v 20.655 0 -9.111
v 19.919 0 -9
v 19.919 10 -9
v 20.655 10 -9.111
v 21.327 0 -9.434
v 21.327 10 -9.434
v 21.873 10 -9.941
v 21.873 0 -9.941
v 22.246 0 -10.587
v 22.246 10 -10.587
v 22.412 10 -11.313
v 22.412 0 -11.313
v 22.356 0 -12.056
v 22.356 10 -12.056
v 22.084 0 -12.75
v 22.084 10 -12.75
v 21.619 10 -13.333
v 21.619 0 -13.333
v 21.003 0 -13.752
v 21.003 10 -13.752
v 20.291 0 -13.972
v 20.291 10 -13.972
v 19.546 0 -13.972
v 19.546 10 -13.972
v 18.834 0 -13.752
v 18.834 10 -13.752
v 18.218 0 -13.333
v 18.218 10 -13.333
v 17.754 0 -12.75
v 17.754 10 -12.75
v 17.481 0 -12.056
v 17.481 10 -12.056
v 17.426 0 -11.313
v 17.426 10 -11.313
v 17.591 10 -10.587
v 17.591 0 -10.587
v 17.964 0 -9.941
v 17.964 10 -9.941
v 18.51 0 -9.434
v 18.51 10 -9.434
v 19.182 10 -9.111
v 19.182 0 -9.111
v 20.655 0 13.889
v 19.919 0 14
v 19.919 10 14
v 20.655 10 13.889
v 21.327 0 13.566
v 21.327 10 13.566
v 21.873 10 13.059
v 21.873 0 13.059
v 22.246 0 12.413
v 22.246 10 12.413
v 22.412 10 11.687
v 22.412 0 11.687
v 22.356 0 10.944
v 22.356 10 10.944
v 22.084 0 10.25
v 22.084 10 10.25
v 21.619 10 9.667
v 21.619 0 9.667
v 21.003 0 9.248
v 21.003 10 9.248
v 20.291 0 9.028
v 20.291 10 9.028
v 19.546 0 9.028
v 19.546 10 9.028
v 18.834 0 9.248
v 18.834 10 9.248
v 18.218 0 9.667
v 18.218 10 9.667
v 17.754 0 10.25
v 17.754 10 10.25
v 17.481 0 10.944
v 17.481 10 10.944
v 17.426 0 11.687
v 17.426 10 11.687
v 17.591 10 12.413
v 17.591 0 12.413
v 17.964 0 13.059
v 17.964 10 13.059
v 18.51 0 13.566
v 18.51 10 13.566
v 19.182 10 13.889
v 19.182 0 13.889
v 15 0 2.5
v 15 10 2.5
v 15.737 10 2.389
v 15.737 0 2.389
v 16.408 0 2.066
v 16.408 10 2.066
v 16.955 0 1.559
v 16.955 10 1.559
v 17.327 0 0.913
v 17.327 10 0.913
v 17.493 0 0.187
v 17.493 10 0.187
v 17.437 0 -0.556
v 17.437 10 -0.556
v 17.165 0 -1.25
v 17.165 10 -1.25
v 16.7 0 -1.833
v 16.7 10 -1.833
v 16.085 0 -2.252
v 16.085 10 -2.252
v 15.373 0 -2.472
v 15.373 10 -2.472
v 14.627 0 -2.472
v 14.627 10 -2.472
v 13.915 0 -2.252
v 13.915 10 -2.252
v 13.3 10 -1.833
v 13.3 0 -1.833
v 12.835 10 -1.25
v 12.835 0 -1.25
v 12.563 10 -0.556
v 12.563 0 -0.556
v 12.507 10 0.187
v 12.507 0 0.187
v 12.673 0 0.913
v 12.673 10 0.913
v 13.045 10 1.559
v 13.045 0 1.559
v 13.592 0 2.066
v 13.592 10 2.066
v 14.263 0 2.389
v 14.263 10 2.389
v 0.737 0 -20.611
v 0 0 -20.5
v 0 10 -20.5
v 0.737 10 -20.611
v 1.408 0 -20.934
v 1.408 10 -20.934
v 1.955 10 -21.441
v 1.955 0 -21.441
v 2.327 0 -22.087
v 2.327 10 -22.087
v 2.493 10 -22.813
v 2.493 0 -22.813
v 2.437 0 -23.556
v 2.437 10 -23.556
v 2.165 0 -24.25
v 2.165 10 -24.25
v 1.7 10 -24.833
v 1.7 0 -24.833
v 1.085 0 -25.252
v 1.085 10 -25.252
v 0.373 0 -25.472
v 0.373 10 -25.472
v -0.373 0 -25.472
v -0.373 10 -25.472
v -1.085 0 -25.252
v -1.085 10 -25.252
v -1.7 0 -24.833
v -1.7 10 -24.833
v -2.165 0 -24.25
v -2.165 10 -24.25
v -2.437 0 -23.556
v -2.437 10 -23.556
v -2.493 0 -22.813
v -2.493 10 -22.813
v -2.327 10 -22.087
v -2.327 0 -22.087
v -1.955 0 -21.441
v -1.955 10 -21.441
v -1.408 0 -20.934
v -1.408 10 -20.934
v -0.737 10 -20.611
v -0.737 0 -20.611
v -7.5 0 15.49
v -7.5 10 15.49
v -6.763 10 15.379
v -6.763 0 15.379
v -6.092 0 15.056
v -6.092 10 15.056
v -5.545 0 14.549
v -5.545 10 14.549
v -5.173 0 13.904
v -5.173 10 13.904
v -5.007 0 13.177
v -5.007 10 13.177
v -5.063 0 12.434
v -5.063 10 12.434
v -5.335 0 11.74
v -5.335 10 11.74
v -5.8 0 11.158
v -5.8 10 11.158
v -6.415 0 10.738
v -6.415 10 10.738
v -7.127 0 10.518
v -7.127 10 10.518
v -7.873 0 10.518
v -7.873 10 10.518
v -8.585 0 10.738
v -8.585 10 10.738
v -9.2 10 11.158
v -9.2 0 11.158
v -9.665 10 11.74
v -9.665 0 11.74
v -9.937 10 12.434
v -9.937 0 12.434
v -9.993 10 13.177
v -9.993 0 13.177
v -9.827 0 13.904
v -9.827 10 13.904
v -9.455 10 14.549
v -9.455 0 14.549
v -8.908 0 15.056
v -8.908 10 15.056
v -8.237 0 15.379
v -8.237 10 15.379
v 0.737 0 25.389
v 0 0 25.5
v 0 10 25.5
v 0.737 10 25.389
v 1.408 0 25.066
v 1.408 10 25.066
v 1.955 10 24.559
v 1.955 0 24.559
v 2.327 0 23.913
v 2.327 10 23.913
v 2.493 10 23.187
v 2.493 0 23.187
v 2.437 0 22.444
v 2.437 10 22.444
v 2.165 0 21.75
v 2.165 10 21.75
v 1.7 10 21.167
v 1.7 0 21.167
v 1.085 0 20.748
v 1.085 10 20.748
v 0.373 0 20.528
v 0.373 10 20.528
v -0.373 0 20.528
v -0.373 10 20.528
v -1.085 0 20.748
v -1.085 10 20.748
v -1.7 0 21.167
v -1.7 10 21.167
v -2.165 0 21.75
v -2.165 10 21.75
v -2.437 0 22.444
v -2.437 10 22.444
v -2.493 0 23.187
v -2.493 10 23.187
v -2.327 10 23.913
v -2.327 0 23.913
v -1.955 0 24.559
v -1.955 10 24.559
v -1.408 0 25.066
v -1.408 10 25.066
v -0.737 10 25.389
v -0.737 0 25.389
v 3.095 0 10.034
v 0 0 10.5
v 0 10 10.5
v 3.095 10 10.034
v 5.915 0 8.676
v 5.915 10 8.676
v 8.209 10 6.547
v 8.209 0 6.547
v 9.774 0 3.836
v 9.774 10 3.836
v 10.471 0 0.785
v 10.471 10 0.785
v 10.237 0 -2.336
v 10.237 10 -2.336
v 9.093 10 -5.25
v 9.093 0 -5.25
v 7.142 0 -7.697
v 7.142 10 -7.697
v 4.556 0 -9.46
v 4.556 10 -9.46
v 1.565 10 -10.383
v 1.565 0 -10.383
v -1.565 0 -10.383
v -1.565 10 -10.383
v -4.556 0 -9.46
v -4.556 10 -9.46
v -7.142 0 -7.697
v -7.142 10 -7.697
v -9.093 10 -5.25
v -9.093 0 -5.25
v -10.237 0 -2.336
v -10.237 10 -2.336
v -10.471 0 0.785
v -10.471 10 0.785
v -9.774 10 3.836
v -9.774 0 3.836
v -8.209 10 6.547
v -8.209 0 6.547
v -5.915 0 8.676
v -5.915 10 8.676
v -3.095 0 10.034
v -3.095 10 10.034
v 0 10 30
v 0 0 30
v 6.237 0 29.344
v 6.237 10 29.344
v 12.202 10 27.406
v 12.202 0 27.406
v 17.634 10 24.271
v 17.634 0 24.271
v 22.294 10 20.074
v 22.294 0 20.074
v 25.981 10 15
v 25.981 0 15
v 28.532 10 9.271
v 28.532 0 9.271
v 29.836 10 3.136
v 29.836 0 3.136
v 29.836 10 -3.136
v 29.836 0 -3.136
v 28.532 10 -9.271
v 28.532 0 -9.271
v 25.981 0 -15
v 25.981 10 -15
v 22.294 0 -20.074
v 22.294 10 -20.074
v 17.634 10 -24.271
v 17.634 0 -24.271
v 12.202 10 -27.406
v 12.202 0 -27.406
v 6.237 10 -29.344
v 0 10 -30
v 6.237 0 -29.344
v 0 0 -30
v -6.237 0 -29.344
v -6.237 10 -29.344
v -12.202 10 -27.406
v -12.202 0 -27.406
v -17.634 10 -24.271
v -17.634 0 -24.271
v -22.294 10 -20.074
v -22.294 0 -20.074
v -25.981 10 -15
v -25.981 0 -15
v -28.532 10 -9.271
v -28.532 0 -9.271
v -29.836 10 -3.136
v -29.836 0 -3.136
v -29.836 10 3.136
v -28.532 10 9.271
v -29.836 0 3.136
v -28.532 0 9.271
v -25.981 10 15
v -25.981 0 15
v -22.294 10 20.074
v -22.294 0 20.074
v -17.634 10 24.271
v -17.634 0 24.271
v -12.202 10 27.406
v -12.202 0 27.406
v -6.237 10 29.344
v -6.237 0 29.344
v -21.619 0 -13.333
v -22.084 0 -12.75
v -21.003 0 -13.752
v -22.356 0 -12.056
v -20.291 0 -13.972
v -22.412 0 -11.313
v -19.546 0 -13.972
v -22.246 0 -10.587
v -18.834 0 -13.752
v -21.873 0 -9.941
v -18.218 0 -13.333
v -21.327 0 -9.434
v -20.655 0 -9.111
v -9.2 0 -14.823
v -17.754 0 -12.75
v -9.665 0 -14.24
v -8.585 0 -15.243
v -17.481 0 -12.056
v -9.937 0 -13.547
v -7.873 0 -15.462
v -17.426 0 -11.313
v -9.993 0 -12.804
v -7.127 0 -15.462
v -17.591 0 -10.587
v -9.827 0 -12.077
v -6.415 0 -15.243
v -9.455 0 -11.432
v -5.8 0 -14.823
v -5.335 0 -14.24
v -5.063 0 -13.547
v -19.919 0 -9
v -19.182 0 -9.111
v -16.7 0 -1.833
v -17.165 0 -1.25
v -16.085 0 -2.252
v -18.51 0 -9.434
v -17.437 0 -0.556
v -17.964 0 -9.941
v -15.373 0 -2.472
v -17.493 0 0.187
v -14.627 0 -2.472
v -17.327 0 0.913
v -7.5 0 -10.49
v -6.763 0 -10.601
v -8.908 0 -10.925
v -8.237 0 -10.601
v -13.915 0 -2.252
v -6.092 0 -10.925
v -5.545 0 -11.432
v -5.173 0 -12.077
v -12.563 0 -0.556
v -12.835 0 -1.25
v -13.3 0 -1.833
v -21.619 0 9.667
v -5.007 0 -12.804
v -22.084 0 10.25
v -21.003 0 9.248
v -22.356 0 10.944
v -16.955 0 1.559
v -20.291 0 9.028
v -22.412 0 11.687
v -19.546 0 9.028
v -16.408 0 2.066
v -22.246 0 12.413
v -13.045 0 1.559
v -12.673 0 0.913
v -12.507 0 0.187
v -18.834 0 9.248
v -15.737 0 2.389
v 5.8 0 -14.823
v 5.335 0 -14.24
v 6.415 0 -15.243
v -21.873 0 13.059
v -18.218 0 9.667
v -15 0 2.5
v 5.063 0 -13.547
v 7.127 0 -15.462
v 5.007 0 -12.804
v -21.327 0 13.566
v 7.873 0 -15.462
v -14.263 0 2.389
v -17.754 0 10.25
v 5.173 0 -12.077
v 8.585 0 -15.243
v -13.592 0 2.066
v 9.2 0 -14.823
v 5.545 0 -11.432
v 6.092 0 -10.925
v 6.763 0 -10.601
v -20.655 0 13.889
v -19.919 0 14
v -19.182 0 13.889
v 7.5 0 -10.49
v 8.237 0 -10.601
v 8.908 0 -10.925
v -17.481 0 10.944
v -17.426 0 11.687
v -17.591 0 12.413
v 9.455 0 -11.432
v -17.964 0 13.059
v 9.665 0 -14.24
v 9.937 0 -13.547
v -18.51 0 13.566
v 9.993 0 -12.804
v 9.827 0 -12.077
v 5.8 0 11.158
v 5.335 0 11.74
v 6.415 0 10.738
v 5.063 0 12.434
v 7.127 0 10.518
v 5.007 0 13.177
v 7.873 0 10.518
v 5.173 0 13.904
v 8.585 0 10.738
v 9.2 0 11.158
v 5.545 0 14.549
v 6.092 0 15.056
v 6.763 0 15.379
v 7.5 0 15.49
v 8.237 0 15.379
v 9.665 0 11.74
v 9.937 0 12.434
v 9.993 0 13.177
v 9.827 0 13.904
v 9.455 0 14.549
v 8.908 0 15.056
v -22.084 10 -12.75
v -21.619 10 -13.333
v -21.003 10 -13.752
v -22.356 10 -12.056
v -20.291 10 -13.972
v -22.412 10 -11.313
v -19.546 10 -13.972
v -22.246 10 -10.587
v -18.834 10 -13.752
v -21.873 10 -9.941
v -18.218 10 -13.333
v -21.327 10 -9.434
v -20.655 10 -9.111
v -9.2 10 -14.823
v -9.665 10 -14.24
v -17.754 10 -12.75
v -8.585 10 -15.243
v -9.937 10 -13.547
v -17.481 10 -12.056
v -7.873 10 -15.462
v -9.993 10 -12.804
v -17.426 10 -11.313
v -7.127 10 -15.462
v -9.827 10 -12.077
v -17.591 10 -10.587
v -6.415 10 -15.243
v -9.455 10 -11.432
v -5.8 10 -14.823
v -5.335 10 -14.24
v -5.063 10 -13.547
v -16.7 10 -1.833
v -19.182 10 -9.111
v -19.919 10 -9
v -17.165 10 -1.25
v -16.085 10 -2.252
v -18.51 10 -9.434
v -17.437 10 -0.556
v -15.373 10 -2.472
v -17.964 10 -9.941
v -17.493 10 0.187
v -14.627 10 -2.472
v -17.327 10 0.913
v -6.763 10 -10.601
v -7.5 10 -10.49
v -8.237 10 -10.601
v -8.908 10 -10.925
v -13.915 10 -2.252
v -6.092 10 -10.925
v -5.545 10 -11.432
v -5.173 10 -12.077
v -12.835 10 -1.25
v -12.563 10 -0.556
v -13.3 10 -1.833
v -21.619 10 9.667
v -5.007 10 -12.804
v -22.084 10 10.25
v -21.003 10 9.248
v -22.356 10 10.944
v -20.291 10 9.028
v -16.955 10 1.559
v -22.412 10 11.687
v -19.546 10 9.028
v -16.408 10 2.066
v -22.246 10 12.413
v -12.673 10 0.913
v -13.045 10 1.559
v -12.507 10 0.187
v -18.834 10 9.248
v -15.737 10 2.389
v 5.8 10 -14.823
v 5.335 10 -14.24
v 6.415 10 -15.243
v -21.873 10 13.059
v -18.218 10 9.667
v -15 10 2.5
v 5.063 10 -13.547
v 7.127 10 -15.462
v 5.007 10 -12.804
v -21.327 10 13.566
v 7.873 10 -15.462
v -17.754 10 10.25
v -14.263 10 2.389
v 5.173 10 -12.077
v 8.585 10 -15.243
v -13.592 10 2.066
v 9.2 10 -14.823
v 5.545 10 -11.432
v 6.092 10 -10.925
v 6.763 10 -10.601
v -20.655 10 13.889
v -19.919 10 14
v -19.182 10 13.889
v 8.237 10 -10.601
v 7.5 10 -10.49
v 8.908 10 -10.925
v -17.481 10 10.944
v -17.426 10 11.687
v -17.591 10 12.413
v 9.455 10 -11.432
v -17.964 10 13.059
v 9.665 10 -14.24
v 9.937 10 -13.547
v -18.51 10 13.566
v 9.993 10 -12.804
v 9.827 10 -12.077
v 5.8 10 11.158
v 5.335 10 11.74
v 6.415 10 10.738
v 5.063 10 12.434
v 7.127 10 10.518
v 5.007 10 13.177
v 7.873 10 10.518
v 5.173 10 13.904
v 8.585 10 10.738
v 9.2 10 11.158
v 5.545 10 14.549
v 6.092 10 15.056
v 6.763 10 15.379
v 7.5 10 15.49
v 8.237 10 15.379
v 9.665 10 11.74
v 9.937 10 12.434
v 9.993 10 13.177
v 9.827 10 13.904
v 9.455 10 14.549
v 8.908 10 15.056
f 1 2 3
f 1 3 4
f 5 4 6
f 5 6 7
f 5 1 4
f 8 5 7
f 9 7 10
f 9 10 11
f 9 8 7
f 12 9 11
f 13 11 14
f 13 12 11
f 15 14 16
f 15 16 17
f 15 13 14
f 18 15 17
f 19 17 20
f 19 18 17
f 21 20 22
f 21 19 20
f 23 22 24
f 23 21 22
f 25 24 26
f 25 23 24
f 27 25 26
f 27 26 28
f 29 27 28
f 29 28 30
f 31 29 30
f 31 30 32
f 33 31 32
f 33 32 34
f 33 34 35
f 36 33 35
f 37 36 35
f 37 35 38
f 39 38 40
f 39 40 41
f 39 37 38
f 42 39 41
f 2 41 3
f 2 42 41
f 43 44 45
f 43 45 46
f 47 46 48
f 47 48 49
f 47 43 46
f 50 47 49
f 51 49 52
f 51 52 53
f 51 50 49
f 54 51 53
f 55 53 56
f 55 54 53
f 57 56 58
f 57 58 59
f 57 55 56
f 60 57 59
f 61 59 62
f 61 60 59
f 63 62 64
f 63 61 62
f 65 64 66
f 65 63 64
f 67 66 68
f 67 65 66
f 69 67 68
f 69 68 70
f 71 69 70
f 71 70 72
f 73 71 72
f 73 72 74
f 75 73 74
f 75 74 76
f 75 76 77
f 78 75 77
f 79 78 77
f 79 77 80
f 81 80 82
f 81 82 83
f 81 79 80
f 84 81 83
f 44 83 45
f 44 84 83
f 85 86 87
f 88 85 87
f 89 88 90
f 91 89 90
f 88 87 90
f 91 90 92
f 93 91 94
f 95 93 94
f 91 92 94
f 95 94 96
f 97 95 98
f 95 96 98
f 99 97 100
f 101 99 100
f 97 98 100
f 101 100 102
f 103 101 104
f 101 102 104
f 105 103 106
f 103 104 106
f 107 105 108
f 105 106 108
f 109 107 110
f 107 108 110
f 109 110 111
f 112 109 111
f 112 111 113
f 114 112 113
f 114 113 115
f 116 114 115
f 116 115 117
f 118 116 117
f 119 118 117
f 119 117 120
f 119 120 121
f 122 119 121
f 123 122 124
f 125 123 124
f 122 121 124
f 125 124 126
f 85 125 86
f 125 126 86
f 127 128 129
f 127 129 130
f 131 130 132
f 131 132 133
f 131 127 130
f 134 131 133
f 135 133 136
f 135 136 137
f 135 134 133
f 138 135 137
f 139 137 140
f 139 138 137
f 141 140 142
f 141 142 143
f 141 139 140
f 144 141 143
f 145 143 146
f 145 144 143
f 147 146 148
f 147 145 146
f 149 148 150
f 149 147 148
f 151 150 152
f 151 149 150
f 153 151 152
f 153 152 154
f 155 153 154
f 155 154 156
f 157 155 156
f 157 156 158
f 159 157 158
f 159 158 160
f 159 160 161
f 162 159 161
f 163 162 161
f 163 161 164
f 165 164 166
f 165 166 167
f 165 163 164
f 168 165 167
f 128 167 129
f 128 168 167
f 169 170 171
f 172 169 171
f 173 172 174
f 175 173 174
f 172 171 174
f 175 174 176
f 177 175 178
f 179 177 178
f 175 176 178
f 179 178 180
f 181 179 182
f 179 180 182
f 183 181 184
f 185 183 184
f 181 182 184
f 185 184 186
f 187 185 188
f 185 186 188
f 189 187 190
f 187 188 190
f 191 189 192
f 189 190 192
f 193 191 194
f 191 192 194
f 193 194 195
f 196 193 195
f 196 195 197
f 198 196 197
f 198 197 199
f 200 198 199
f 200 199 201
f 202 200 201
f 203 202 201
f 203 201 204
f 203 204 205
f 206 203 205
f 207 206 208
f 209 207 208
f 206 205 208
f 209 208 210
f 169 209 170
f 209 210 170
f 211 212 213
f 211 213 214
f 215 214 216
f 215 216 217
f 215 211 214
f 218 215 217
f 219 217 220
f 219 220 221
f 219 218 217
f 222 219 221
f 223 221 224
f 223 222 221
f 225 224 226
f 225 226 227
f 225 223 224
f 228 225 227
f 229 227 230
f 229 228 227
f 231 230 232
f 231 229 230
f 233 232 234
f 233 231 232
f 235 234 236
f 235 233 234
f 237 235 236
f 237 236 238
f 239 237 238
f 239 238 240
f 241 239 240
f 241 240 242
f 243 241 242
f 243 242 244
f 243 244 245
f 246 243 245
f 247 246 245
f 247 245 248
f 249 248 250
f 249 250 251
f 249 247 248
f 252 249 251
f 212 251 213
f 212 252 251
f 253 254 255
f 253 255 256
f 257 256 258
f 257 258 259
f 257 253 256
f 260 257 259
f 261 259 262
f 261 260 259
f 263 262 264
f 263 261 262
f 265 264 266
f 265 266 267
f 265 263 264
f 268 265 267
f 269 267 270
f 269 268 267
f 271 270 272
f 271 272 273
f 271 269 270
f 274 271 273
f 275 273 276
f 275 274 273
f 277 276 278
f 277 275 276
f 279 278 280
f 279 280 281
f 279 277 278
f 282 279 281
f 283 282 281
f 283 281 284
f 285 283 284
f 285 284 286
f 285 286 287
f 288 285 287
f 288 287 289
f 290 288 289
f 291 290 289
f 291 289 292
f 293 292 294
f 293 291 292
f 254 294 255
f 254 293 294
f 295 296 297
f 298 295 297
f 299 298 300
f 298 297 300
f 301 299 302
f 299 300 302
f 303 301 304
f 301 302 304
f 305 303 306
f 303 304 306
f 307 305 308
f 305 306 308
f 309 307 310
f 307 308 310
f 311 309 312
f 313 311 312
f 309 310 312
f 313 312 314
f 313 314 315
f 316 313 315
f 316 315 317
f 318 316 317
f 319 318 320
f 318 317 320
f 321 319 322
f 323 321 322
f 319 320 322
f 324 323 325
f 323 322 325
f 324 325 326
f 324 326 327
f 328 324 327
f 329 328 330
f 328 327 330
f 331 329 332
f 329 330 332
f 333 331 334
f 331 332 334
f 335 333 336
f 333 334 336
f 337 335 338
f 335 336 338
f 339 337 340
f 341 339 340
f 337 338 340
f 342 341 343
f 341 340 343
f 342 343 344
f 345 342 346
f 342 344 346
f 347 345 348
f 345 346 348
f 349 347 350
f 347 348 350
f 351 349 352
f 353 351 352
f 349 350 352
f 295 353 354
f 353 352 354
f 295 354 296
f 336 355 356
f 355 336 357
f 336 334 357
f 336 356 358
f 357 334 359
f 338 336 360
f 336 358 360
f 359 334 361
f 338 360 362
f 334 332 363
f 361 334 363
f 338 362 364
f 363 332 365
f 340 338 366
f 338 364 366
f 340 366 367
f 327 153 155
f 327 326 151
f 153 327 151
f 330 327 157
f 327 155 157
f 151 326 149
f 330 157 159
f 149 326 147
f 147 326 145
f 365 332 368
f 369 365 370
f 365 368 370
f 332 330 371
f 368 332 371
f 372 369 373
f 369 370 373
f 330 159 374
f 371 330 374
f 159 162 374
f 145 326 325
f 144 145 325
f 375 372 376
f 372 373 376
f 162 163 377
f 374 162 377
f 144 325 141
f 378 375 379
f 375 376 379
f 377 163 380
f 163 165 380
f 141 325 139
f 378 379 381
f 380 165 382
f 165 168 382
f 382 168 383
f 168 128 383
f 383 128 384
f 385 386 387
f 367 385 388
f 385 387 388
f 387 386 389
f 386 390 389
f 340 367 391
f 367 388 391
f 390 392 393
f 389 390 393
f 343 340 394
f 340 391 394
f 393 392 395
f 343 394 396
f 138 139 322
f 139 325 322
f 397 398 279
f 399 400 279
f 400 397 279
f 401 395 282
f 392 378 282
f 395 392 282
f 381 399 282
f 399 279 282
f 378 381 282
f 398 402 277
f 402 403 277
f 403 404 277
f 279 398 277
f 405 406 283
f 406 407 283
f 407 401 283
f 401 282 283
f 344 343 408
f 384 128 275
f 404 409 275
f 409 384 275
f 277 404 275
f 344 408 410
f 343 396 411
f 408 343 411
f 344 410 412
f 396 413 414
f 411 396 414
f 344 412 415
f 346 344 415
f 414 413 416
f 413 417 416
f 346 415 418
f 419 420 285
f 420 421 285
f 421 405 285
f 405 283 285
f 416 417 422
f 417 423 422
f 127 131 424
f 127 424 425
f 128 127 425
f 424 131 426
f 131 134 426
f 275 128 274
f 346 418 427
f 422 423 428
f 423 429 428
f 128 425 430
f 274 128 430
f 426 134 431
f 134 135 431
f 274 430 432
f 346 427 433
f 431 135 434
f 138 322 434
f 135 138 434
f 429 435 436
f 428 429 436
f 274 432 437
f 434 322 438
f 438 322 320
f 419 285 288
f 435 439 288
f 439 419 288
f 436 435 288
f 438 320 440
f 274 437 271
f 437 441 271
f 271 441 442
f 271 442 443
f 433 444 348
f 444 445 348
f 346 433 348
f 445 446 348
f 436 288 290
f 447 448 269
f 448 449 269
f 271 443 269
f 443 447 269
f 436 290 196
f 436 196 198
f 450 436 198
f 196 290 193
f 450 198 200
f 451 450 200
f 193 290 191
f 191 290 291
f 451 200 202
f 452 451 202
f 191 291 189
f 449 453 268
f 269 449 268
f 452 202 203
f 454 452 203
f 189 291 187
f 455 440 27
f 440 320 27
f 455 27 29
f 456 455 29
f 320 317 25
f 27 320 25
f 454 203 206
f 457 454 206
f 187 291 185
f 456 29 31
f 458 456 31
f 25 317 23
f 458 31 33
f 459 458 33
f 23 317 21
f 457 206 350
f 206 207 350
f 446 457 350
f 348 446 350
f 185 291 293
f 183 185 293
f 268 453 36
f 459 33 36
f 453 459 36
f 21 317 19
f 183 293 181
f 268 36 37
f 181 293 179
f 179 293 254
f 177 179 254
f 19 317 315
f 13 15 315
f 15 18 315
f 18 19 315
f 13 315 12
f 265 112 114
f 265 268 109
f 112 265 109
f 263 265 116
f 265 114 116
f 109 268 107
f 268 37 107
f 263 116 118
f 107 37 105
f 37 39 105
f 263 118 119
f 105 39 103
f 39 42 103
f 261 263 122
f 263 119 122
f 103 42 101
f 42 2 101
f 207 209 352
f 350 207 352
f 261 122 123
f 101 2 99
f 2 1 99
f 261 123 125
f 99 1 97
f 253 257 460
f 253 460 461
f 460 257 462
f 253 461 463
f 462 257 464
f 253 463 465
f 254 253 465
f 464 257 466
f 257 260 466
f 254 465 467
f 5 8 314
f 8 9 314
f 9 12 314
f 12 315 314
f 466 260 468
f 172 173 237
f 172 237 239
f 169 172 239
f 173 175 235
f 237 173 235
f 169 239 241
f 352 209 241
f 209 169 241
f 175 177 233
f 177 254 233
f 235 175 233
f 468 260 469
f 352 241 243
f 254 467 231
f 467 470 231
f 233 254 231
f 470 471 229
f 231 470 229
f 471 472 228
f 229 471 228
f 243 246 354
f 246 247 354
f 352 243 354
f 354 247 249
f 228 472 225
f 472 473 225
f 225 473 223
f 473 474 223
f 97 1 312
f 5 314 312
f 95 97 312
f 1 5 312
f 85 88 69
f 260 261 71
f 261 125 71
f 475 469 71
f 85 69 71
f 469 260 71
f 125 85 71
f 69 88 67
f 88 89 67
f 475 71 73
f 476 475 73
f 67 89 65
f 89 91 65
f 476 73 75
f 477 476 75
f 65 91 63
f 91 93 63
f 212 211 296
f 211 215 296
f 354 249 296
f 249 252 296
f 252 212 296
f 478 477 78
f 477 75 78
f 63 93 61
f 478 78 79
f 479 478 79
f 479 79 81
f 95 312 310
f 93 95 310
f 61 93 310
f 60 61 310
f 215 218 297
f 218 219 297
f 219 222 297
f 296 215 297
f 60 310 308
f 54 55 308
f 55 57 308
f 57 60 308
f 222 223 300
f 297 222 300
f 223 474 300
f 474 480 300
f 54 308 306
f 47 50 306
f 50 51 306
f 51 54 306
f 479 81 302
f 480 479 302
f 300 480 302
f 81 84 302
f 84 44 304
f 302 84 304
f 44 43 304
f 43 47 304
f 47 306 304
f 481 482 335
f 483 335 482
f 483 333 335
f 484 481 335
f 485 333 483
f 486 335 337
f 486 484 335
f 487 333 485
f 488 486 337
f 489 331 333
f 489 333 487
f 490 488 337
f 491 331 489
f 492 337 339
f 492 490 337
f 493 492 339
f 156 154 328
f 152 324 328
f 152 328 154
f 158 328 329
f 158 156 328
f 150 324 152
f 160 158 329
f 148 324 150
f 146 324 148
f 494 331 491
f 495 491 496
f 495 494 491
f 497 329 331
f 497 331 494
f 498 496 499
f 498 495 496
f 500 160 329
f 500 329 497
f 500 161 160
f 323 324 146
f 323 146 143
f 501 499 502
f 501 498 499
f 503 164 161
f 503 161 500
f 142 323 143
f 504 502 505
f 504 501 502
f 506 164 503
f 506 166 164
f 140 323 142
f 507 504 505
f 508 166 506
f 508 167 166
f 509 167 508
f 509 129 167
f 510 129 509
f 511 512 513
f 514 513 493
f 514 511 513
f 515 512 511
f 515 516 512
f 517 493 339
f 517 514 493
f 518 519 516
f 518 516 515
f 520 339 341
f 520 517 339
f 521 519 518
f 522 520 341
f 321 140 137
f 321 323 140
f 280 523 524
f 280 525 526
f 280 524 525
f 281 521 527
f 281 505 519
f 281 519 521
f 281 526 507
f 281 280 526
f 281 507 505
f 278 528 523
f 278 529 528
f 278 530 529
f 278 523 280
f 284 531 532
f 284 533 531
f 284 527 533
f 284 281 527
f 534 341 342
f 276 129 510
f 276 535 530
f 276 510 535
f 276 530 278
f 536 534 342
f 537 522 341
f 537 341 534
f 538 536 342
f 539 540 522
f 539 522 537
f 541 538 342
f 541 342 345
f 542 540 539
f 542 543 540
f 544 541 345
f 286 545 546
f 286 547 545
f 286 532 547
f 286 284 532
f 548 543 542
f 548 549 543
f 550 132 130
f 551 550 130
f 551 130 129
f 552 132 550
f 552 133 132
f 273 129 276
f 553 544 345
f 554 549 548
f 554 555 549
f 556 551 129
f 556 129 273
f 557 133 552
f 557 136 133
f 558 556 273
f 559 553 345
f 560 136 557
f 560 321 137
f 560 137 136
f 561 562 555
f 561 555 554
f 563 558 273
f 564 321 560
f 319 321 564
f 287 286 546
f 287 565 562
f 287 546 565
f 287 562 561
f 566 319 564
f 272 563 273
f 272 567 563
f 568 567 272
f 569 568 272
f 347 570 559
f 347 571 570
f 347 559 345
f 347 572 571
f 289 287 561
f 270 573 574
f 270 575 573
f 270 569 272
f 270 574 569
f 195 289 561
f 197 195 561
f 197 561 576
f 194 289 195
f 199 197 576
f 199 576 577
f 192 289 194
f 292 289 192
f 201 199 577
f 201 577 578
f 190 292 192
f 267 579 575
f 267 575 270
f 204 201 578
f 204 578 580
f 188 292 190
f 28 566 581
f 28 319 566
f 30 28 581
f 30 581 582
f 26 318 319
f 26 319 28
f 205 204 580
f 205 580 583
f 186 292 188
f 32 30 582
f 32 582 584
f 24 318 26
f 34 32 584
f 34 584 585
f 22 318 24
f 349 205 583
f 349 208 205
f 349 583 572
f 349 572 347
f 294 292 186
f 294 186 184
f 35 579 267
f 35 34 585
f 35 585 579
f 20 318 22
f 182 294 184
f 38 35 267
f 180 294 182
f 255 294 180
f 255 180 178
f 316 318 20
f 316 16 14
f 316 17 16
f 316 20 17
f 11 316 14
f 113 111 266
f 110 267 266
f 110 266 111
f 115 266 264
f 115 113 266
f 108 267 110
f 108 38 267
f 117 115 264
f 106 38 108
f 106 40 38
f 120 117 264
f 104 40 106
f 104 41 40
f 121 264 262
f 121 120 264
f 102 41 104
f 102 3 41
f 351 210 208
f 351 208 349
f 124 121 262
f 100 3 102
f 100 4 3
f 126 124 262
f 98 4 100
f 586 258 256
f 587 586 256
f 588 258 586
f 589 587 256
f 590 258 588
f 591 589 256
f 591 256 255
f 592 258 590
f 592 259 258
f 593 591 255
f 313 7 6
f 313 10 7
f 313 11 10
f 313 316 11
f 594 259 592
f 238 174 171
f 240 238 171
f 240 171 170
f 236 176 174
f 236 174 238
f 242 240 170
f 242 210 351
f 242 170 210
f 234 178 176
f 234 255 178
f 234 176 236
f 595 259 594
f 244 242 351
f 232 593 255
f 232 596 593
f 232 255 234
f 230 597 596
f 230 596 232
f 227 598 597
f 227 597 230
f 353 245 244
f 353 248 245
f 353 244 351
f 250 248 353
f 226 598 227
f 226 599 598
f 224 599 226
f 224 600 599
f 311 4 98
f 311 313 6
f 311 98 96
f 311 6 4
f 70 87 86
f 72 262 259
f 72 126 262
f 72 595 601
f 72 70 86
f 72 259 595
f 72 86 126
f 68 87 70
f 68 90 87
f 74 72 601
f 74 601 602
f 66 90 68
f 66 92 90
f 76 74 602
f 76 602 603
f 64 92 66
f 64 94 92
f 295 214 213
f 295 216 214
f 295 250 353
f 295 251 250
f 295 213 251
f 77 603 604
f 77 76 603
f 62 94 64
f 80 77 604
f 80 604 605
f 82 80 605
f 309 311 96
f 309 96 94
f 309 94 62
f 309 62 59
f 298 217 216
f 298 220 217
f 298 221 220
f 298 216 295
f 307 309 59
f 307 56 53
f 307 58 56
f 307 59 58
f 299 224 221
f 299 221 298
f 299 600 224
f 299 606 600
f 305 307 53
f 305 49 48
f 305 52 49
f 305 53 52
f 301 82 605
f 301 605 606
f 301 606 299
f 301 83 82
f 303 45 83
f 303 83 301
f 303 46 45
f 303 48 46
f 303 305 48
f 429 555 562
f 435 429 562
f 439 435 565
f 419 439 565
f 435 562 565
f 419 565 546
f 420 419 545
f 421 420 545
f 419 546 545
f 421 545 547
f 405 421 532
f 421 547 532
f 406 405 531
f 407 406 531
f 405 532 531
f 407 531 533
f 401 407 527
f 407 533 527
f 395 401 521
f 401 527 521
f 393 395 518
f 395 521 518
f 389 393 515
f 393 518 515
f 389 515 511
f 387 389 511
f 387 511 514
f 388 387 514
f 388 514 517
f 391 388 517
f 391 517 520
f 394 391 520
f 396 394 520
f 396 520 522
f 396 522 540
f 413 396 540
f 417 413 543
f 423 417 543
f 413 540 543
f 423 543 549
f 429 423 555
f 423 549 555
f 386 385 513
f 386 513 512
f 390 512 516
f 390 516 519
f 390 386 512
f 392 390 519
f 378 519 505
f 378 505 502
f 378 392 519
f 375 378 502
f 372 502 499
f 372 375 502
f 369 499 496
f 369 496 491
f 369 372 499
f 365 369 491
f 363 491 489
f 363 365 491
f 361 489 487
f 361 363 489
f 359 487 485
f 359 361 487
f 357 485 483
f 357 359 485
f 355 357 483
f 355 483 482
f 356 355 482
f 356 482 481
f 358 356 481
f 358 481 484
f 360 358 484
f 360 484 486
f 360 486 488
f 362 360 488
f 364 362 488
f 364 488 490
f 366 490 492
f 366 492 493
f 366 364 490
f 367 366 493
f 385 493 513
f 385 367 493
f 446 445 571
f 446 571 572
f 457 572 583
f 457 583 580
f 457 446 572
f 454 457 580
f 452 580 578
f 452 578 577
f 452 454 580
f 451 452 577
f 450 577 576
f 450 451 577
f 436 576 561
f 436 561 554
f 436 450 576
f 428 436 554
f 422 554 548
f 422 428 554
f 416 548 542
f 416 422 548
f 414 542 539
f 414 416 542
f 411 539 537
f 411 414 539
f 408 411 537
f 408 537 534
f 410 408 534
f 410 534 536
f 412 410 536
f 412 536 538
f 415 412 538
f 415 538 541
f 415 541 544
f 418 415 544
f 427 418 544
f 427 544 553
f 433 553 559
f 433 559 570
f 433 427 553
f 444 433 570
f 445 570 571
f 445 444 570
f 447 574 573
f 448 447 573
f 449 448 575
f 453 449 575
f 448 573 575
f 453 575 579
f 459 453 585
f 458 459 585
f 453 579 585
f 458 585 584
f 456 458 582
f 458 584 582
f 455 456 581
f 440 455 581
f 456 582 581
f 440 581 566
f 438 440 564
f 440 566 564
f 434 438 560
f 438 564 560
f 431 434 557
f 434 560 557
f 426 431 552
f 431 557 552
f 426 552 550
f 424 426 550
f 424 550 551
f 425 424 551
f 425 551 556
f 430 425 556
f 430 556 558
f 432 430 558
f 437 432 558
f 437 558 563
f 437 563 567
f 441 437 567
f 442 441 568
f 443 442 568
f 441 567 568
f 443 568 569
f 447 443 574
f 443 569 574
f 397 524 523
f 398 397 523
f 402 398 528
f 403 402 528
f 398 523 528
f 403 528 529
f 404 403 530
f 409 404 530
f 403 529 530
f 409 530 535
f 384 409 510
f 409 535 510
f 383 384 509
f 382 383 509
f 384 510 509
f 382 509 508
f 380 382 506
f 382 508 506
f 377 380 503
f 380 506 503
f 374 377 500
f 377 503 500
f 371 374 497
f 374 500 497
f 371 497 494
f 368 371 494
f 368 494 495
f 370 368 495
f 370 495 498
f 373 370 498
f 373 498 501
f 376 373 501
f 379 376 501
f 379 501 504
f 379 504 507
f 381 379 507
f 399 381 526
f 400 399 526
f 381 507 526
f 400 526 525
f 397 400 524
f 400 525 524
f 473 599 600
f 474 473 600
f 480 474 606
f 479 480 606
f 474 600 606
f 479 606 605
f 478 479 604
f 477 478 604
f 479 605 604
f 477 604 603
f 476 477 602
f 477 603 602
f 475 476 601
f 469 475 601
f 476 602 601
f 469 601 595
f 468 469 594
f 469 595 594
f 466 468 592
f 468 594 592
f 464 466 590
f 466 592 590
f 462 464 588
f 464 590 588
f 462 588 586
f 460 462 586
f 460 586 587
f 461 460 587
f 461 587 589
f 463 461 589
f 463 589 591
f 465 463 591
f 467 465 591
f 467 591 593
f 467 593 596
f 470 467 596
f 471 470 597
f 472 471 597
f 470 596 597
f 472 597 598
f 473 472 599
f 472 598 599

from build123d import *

# Parameters (mm, degrees)
SKETCH1_R           = 30
SKETCH1_R_2         = 2.5
SKETCH1_R_3         = 10.5
BOSS_EXTRUDE1_DEPTH = 10
SKETCH2_R           = 2.5
CUT_EXTRUDE1_DEPTH  = 10


with BuildPart() as part:
    # Sketch1 → Boss-Extrude1 (new body)
    with BuildSketch(Plane(origin=(0, 0, 0), x_dir=(1, 0, 0), z_dir=(0, 1, 0))):
        with Locations(Location((0, 0, 0), (0, 0, 270))):
            Circle(SKETCH1_R)
        with Locations(Location((0, 23, 0), (0, 0, 270))):
            Circle(SKETCH1_R_2, mode=Mode.SUBTRACT)
        with Locations(Location((19.918584287, 11.5, 0), (0, 0, 270))):
            Circle(SKETCH1_R_2, mode=Mode.SUBTRACT)
        with Locations(Location((19.918584287, -11.5, 0), (0, 0, 270))):
            Circle(SKETCH1_R_2, mode=Mode.SUBTRACT)
        with Locations(Location((0, -23, 0), (0, 0, 270))):
            Circle(SKETCH1_R_2, mode=Mode.SUBTRACT)
        with Locations(Location((-19.918584287, -11.5, 0), (0, 0, 270))):
            Circle(SKETCH1_R_2, mode=Mode.SUBTRACT)
        with Locations(Location((-19.918584287, 11.5, 0), (0, 0, 270))):
            Circle(SKETCH1_R_2, mode=Mode.SUBTRACT)
        with Locations(Location((0, 0, 0), (0, 0, 270))):
            Circle(SKETCH1_R_3, mode=Mode.SUBTRACT)
    extrude(amount=BOSS_EXTRUDE1_DEPTH)

    # Sketch2 → Cut-Extrude1 (cut)
    with BuildSketch(Plane(origin=(0, 10, 0), x_dir=(1, 0, 0), z_dir=(0, 1, 0))):
        with Locations(Location((-7.5, 12.990381057, 0), (0, 0, 270))):
            Circle(SKETCH2_R)
        with Locations(Location((7.5, 12.990381057, 0), (0, 0, 270))):
            Circle(SKETCH2_R)
        with Locations(Location((15, 0, 0), (0, 0, 270))):
            Circle(SKETCH2_R)
        with Locations(Location((7.5, -12.990381057, 0), (0, 0, 270))):
            Circle(SKETCH2_R)
        with Locations(Location((-7.5, -12.990381057, 0), (0, 0, 270))):
            Circle(SKETCH2_R)
        with Locations(Location((-15, 0, 0), (0, 0, 270))):
            Circle(SKETCH2_R)
    extrude(amount=-CUT_EXTRUDE1_DEPTH, mode=Mode.SUBTRACT)


solid = part.part
